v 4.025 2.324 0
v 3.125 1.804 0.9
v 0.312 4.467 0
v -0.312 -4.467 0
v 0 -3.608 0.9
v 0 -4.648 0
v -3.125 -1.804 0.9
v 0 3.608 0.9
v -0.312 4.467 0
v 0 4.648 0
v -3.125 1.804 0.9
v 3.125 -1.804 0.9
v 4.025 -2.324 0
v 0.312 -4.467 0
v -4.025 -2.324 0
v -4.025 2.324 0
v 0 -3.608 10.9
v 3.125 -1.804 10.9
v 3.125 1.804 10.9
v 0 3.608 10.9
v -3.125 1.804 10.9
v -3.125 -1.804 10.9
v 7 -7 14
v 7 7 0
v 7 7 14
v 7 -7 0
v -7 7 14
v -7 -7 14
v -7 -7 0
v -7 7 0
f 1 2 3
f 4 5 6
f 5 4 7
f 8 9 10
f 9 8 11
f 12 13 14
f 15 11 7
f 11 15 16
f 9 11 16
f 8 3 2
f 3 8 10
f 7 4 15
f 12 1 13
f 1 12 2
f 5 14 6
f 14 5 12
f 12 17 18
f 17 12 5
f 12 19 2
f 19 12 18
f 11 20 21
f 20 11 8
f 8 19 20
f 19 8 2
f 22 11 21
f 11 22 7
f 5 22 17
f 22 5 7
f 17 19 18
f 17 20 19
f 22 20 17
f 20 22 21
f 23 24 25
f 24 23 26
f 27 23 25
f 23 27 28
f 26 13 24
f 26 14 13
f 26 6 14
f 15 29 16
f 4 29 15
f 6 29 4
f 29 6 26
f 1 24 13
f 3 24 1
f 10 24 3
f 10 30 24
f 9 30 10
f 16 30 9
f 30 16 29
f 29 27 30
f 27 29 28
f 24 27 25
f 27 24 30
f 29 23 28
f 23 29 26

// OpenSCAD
// file: ../utilities/functions_ext.scad
// Funciones sacadas de otras librerías y de diferentes autores

include <constants_oblomobka.scad>

/* A circular helix of radius a and pitch 2πb is described by the following parametrisation:
x(t) = a*cos(t),
y(t) = a*sin(t),
z(t) = b*t
Licensed under the MIT license.
© 2010 by Elmo Mäntynen
*/
function b(pitch) = pitch/(TAU);
function t(pitch, z) = z/b(pitch);
function helix_curve(pitch, radius, z) = [radius*cos(deg(t(pitch, z))), radius*sin(deg(t(pitch, z))), z];


/* Utility functions.
 * Originally by Hans Häggström, 2010.
 * Dual licenced under Creative Commons Attribution-Share Alike 3.0 and LGPL2 or later
 */
function distance(a, b) = sqrt( (a[0] - b[0])*(a[0] - b[0]) +
                                (a[1] - b[1])*(a[1] - b[1]) +
                                (a[2] - b[2])*(a[2] - b[2]) );

function length2(a) = sqrt( a[0]*a[0] + a[1]*a[1] );

function normalized(a) = a / (max(distance([0,0,0], a), 0.00001));

function normalized_axis(a) = 	a == "x" ? [1, 0, 0]:
                  			 	a == "y" ? [0, 1, 0]:
                   				a == "z" ? [0, 0, 1]: normalized(a);

function angleOfNormalizedVector(n) = [0, -atan2(n[2], length2([n[0], n[1]])), atan2(n[1], n[0]) ];

function angle(v) = angleOfNormalizedVector(normalized(v));

function angleBetweenTwoPoints(a, b) = angle(normalized(b-a));
// file: ../utilities/shapes_oblomobka.scad
// Shapes
// (C) @oblomobka - 2014
// GPL3

include <constants_oblomobka.scad>
include <functions_oblomobka.scad>
include <functions_ext.scad>

use <transformations_oblomobka.scad>

// --- Piramide con base circunscrita en un círculo definido en las variables
module pyramid_circumscribed (	n=4,			// nº lados de la base de la pirámide	
								d1=20,		// diámetro del círculo-base donde se circunscribe la pirámide
								d2=0,		// diámetro del círculo-punta donde se circunscribe la pirámide
								h=10			// altura de la pirámide
								){

if(n%2==0){
	rotate([0,0,180/n])
		cylinder (r1=d1/2/cos(180/n), r2=d2/2/cos(180/n), h=h, $fn=n);
	}
	else{
		rotate([0,0,90/n])
			cylinder (r1=d1/2/cos(180/n), r2=d2/2/cos(180/n), h=h, $fn=n);
		}

}
// ------- pyramid_circumscribed (n=n,d1=d1,d2=d2,h=h); -----------------

// --- Prisma con base circunscrita en un círculo definido en las variables
module prism_circumscribed (	n=4,			// nº lados de la base del prisma
							d=20,		// diámetro del círculo donde se circunscribe el prisma
							h=10			// altura del prisma
							){
if(n%2==0){
	rotate([0,0,180/n])
		cylinder (r=d/2/cos(180/n), h=h, $fn=n);
	}
	else{
		rotate([0,0,90/n])
			cylinder (r=d/2/cos(180/n), h=h, $fn=n);
		}
}
// ------- prism_circumscribed (n=n,d=d,h=h); -----------------



// Toros

// Definido por el diámetro exterior y el diámetro del círculo en revolución
module torusOD (d1,d2,resolution){
$fn=resolution;	
rotate_extrude(){
	translate([d1/2-d2/2,0,0])
		circle(r=d2/2);
	}
}

// Definido por el diámetro exterior y el diámetro interior
module torusOI (d1,d2,resolution){
$fn=resolution;	
d=(d1-d2)/2;
rotate_extrude(){
	translate([d1/2-d/2,0,0])
		circle(r=d/2);
	}
}

// Definido por el diámetro de la línea neutra y el diámetro del círculo en revolución
module torusND (d1,d2,resolution){
$fn=resolution;	
rotate_extrude(){
	translate([d1/2,0,0])
		circle(r=d2/2);
	}
}

module torus_sector(d1,d2,angle=360,mode=1,extreme=true,resolution=32){

if(angle<=0 || angle>=360){
	if(mode==1){torusOD(d1,d2,resolution=resolution);}
	else{if(mode==2){torusND(d1,d2,resolution=resolution);}
	else{if(mode==3){torusOI(d1,d2,resolution=resolution);}}}
	}

else{
	if(mode==1){
		union(){
			sector(angle,d1,d2/2)torusOD(d1,d2,resolution=resolution);
			if(extreme==true){
				translate([d1/2-d2/2,0,0])sphere(d2/2,$fn=resolution);
				translate([(d1/2-d2/2)*cos(angle),(d1/2-d2/2)*sin(angle),0])sphere(d2/2,$fn=resolution);
				}
			}
		}
	else{
		if(mode==2){
			union(){
				sector(angle,d1+d2,d2/2)torusND(d1,d2,resolution=resolution);
				if(extreme==true){
					translate([d1/2,0,0])sphere(d2/2,$fn=resolution);
					translate([d1/2*cos(angle),d1/2*sin(angle),0])sphere(d2/2,$fn=resolution);
					}
				}
			}
		else{
			if(mode==3){
				union(){
					sector(angle,d1,(d1-d2)/4)torusOI(d1,d2,resolution=resolution);
					if(extreme==true){
						translate([d1/2-(d1-d2)/4,0,0])sphere((d1-d2)/4,$fn=resolution);
						translate([(d1/2-(d1-d2)/4)*cos(angle),(d1/2-(d1-d2)/4)*sin(angle),0])sphere((d1-d2)/4,$fn=resolution);
						}
					}
				}
			}
		}
	}
}


// Tubos

module tubeOT (d,t,h,resolution=resolution){	
	difference(){
		cylinder(r=d/2,h=h,$fn=resolution);
		cylinder(r=(d-2*t)/2,h=3*h,center=true,$fn=resolution);
		}
}

// Definido por el diámetro exterior y el diámetro interior
module tubeOI (d1,d2,h,resolution=resolution){
	difference(){
		cylinder(r=d1/2,h=h,$fn=resolution);
		cylinder(r=d2/2,h=3*h,center=true,$fn=resolution);	
		}
}

// Definido por el diámetro de la línea neutra y el diámetro del círculo en revolución
module tubeNT (d,t,h,resolution=resolution){
	difference(){
		cylinder(r=(d+t)/2,h=h,$fn=resolution);
		cylinder(r=(d-t)/2,h=3*h,center=true,$fn=resolution);
	}
}

module tube_sector(d=25,t=2,h=1,angle=360,mode=1,extreme=true,resolution=32){

if(angle<=0 || angle>=360){
	if(mode==1){tubeOT(d,t,h,resolution=resolution);}
	else{if(mode==2){tubeNT(d,t,h,resolution=resolution);}
	else{if(mode==3){tubeOI(d,t,h,resolution=resolution);}}}
	}

else{
	if(mode==1){
		union(){
			sector(angle,d,h)tubeOT(d,t,h,resolution=resolution);
			if(extreme==true){
				translate([d/2-t/2,0,0])cylinder(r=t/2,h=h,$fn=resolution);
				translate([(d/2-t/2)*cos(angle),(d/2-t/2)*sin(angle),0])cylinder(r=t/2,h=h,$fn=resolution);;
				}
			}
		}
	else{
		if(mode==2){
			union(){
				sector(angle,d+t,h)tubeNT(d,t,h,resolution=resolution);
				if(extreme==true){
					translate([d/2,0,0])cylinder(r=t/2,h=h,$fn=resolution);
					translate([d/2*cos(angle),d/2*sin(angle),0])cylinder(r=t/2,h=h,$fn=resolution);
					}
				}
			}
		else{
			if(mode==3){
				union(){
					sector(angle,d,h)tubeOI(d,t,h,resolution=resolution);
					if(extreme==true){
						translate([d/2-(d-t)/4,0,0])cylinder(r=(d-t)/4,h=h,$fn=resolution);
						translate([(d/2-(d-t)/4)*cos(angle),(d/2-(d-t)/4)*sin(angle),0])cylinder(r=(d-t)/4,h=h,$fn=resolution);
						}
					}
				}
			}
		}
	}
}

//torus_sector(d1=15,d2=4,angle=215,mode=3,extreme=true,resolution=50);
//tube_sector(d=24,t=11,h=15,angle=250,mode=1,extreme=true,resolution=50);

pyramid_circumscribed(n=10,d=8,h=4);
// file: ../utilities/transformations_oblomobka.scad
// Transformations
// (C) @oblomobka - 2014
// GPL3

// Transforma una forma en un sector según un ángulo dado.

module sector(	angle, 	// es el ángulo del sector, lo que quedará de la forma original
				d,		// valor auxiliar, será como mínimo igual al diámetro del cilindro que envuelve la forma original
				h		// valor auxiliar, será como mínimo igual a la altura del cilindro que envuelve la forma original
				){

POINTS=[	[0,0,-h],
		[0,0,h],
		[d*cos(0*angle/4),d*sin(0*angle/4),-h],
		[d*cos(0*angle/4),d*sin(0*angle/4),h],
		[d*cos(1*angle/4),d*sin(1*angle/4),-h],
		[d*cos(1*angle/4),d*sin(1*angle/4),h],
		[d*cos(2*angle/4),d*sin(2*angle/4),-h],
		[d*cos(2*angle/4),d*sin(2*angle/4),h],
		[d*cos(3*angle/4),d*sin(3*angle/4),-h],
		[d*cos(3*angle/4),d*sin(3*angle/4),h],
		[d*cos(4*angle/4),d*sin(4*angle/4),-h],
		[d*cos(4*angle/4),d*sin(4*angle/4),h],
		];

TRIANGLES=[	[0,1,2],
			[1,3,2],
			[2,3,4],
			[3,5,4],
			[4,5,6],
			[5,7,6],
			[6,7,8],
			[7,9,8],
			[8,9,10],
			[9,11,10],
			[10,11,0],
			[11,1,0],

			[5,3,1],
			[7,5,1],
			[9,7,1],
			[11,9,1],
			[0,2,4],
			[0,4,6],
			[0,6,8],
			[0,8,10]
			];

if(angle<=0 || angle>=360){
	child();
	}
	else{
		intersection(){
			polyhedron(points=POINTS,triangles=TRIANGLES);
			child();
			}
		}
}

//sector (150,40,10)cylinder(r=20,h=10); // Ejemplo de uso de la tansformación sector()
// file: ../utilities/functions_oblomobka.scad
// Functions
// (C) @oblomobka - 2014
// GPL3

include <constants_oblomobka.scad>

// da el diámetro interior del cono(d1,d2,h) a una altura interior(hi) conocida
function di_cone(d1,d2,h,hi)=d2+(d1-d2)*(1-hi/h);

// da la altura interior del cono(d1,d2,h) a un diametro(di) conocido
function hi_cone(d1,d2,h,di)=-h*((di-d2)/(d1-d2)-1);

// 
function r_circle_intersection (d1,d2)=sqrt(pow(d1/2,2)-pow(d2/2,2));

// Relaciones entre radio, apotema y lado en un polígono de n lados
function side_apothem (apothem,n)=apothem*2*tan(180/n);
function apothem_radius(radius,n)=radius*cos(180/n);
function radius_apothem(apothem,n)=apothem/cos(180/n);
function side_radius (radius,n)=radius*2*sin(180/n);

// limita los posibles valores de x, que siempre estarán comprendidos entre un minimo(a) y un maximo(z)
function lim(a,x,z)=max(a,min(x,z));

// transforma angulo, radianes --> hexadecimal
function deg(angle) = 180*angle/PI;
// transforma angulo, hexadecimal --> radianes
function rad(angle) = angle*PI/180;
// file: ../utilities/limits_oblobots.scad
//PIN
	d_pin_minmax=[10,30];			//	d_pin=lim(d_pin_minmax[0],pin[0],d_pin_minmax[1]);			
	h_pin_minmax=[0,10];			//	h_pin=lim(h_pin_minmax[0],pin[1],h_pin_minmax[1]);

//LEGS & FOOTS
	d_leg_minmax=[10,30];			//	d_leg=lim(d_leg_minmax[0],leg[0],d_leg_minmax[1]);
	h_leg_minmax=[20,90];			//	h_leg=lim(h_leg_minmax[0],leg[1],h_leg_minmax[1]);	
	n_leg_minmax=[4,16];			//	n_leg=lim(n_leg_minmax[0],leg[2],n_leg_minmax[1]);
	legsposition_minmax=[0,100];	// 	legsposition=lim(legsposition_minmax[0],leg[1],legsposition_minmax[1]);

	l_foot_minmax=[24,70];		//	l_foot=lim(l_foot_minmax[0],foot[0],l_foot_minmax[1]);
	h_foot_minmax=[0,40];			//	h_foot=lim(h_foot_minmax[0],foot[1],h_foot_minmax[1]);

//HIP | WAIST
	//C
	d_hip_minmax=[25,80];			//	d_hip=lim(d_hip_minmax[0],hip[0],d_hip_minmax[1]);
	h_hip_minmax=[10,70];			//	h_hip=lim(h_pin+2,hip[1],h_hip_minmax[1]);
	f_hip_minmax=[0,100];			//	f_hip=lim(f_hip_minmax[0],hip[2],f_hip_minmax[1]);

								//	d1_waist=lim(d_pin,waist[0],d_hip);
								//	d2_waist=lim(d_pin,waist[1],d1_waist);
	h_waist_minmax=[0.3,20];		//	h_waist=lim(h_waist_minmax[0],waist[2],h_waist_minmax[1]);

	
	//Q
	x_hip_minmax=[20,90];			//	x_hip=lim(x_hip_minmax[0],hip[0],x_hip_minmax[1]);
	y_hip_minmax=[20,60];			//	y_hip=lim(y_hip_minmax[0],hip[1],y_hip_minmax[1]);
	z_hip_minmax=[10,60];			//	z_hip=lim(z_hip_minmax[0],hip[2],z_hip_minmax[1]);
	bevel_hip_minmax=[0.5,20];	//	bevel_hip=lim(bevel_hip_minmax[0],hip[3],bevel_hip_minmax[1]);

	n_waist_minmax=[4,50];		//	n_waist=lim(n_waist_minmax[0],waist[3],n_waist_minmax[1]);
								//	d1_waist=lim(d_pin,waist[0],min(x_hip,y_hip));
								//	d2_waist=lim(d_pin,waist[1],d1_waist);


//TRUNK | SHOULDER | NECK
	//C
	d1_trunk_minmax=[30,100];		//	d1_trunk=lim(d1_trunk_minmax[0],trunk[0],d1_trunk_minmax[1]); 
	d2_trunk_minmax=[30,100];		//	d2_trunk=lim(d2_trunk_minmax[0],trunk[1],d1_trunk);
	h_trunk_minmax=[24,100];		//	h_trunk=lim(h_trunk_minmax[0],trunk[2],h_trunk_minmax[1]);

	d1_shoulder_minmax=[12,50];	//	d1_shoulder=lim(d1_shoulder_minmax[0],shoulder[0],h_trunk*sin(angle_trunk));
	d_aux_shoulder_minmax=[0,10];	//	d_aux_shoulder=lim(d_aux_shoulder_minmax[0],shoulder[1],d_aux_shoulder_minmax[1]);
	h_shoulder_minmax=[0,50];		//	h_shoulder=lim(h_shoulder_minmax[0],shoulder[2],d2_trunk/2);

								//	d1_neck=lim(d_pin+2,neck[0],d2_trunk);
								//	d2_neck=lim(d_pin+2,neck[1],d1_neck);
	h_neck_minmax=[0.3,20];		//	h_neck=lim(h_neck_minmax[0],neck[2],h_neck_minmax[1]);

	//Q
	x_trunk_minmax=[20,90];		//	x_trunk=lim(x_trunk_minmax[0],trunk[0],x_trunk_minmax[1]);
	y_trunk_minmax=[20,90];		//	y_trunk=lim(d_pin+1+x_trunk/5,trunk[1],y_trunk_minmax[1]);
	z_trunk_minmax=[26,90];		//	z_trunk=lim(z_trunk_minmax[0],trunk[2],z_trunk_minmax[1]);
	
	n_neck_minmax=[4,50];			//	n_neck=lim(n_neck_minmax[0],neck[3],n_neck_minmax[1]);
								//	d1_neck=lim(d_pin+2,neck[0],min(x_trunk,y_trunk));	
								//	d2_neck=lim(d_pin+2,neck[1],d1_neck);

	//ELECTRIC TRUNK
	d_polygonal_trunk_minmax=[45,80];	//d_polygonal_trunk=lim(d_polygonal_trunk_minmax[0],trunk[0],d_polygonal_trunk_minmax[1]);							
	h_polygonal_trunk_minmax=[87,120];	//h_polygonal_trunk=lim(h_polygonal_trunk_minmax[0],trunk[1],h_polygonal_trunk_minmax[1]);
	thickness_trunk_minmax=[1,6];	//thickness_trunk=lim(thickness_trunk_minmax[0],trunk[2],thickness_trunk_minmax[1]);

// ARMS | HANDS
	// C
	d_arm_minmax=[10,40];			// 	d_arm=lim(d_arm_minmax[0],arm[0],d_arm_minmax[1]);
								//	d_arm=lim(d_pin+1,arm[0],d_arm_minmax[1]);	
	h_arm_minmax=[5,25];			// 	h_arm=lim(h_arm_minmax[0],arm[1],h_arm_minmax[1]);
	armpit_minmax=[0.3,60];		//	armpit=lim(armpit_minmax[0],arm[2],armpit_minmax[1]);
	l_arm_minmax=[20,120];		// 	l_arm=lim(d_arm+d_hand,arm[2],l_arm_minmax[1]);	

	d_hand_minmax=[10,60];		//	d_hand=lim(d_hand_minmax[0],hand[0],d_hand_minmax[1]);
	h_hand_minmax=[3,25];			//	h_hand=lim(h_hand_minmax[0],hand[1],h_arm-0.5);
	angle_hand_minmax=[0,180];	//	angle_hand=lim(angle_hand_minmax[0],hand[2]/2,angle_hand_minmax[1]);

	// Q
	x_arm_minmax=[5,25];			// 	x_arm=lim(x_arm_minmax[0],arm[1],x_arm_minmax[1]);
	y_arm_minmax=[10,40];			// 	y_arm=lim(y_arm_minmax[0],arm[0],y_arm_minmax[1]);
	z_arm_minmax=[20,120];		//	z_arm=lim(y_arm+5+d_hand,arm[2],z_arm_minmax[1]);

	n_hand_minmax=[4,12];			// 	n_hand=lim(n_hand_minmax[0],2*floor(hand[2]/2),n_hand_minmax[1]);
								//	h_hand=lim(h_hand_minmax[0],hand[1],x_arm-0.5);

// HEAD | EYES | BRAIN
	// C
	h_head_minmax=[20,100];		// 	h_head=lim(h_head_minmax[0],head[2],h_head_minmax[1]);
	d1_head_minmax=[20,60];		// 	d1_head=lim(h_head_minmax[0],head[0],h_head_minmax[1]);
	d2_head_minmax=[15,150];		// 	d2_head=lim(h_head_minmax[0],head[1],2*h_head+d1_head);

	// Q
	x_head_minmax=[20,100];		// x_head=lim(x_head_minmax[0],head[0],x_head_minmax[1]);
	y_head_minmax=[20,100];		// y_head=lim(y_head_minmax[0],head[1],y_head_minmax[1]);
	z_head_minmax=[20,100];		// z_head=lim(z_head_minmax[0],head[2],z_head_minmax[1]);

	d_eye_minmax=[5,40];			// 	d_eye=lim(d_eye_minmax[0],eye[0],(d1_head+d2_head)/2);
	h_eye_minmax=[1,10];			// 	h_eye=lim(h_eye_minmax[0],eye[1],h_eye_minmax[1]);
	edge_eye_minmax=[1,12];		//	edge_eye=lim(edge_eye_minmax[0],eye[2],d_eye/2-3);

	frown_eye_expression_minmax=[0,100];		// frown_eye_expression=lim(frown_eye_expression_minmax[0],eye_expression[1],frown_eye_expression_minmax[1]);
	bridge_eye_position_minmax=[0,100];		// bridge_eye_position=lim(bridge_eye_position_minmax[0],eye_position[0],bridge_eye_position_minmax[1]);	
	f_h_eye_position_minmax=[0,100];			// f_h_eye_position=lim(f_h_eye_position_minmax[0],eye_position[1],f_h_eye_position_minmax[1]);	

	h_brain_minmax=[0,40];			//	h_brain=lim(h_brain_minmax[0],brain[0],h_brain_minmax[1]);
	edge_brain_minmax=[0,25];			//	edge_brain=lim(edge_brain_minmax[0],brain[1],edge_brain_minmax[1]);

//BADGE
	d_badge_minmax=[20,40];		//	d_badge=lim(d_badge_minmax[0],badge[0],d_badge_minmax[1])
	h_badge_minmax=[0.5,5];		// 	h_badge=lim(h_badge_minmax[0],badge[1],h_badge_minmax[1]);
	n_badge_minmax=[4,50];		// 	n_badge=lim(n_badge_minmax[0],badge[3],n_badge_minmax[1]);
	edge_badge_minmax=[1,5];		//	edge_badge=lim(edge_badge_minmax[0],badge[2],edge_badge_minmax[1]);
// file: ../utilities/external_elements_oblobots.scad
//////////////////////////////////////////////////////////////////////////////////////////////////
// external elements [OBLOBOTS] 
// librería de elementos externos comerciales (botones automáticos, espigas de madera baterías, ...) 
// que se usan en las partes de los oblobots
//////////////////////////////////////////////////////////////////////////////////////////////////
// (c) Jorge Medal (@oblomobka) - Sara Alvarellos (@trecedejunio) 2014-02
//////////////////////////////////////////////////////////////////////////////////////////////////
// GPL license
//////////////////////////////////////////////////////////////////////////////////////////////////

//-- BOTONES AUTOMÁTICOS - Press Fastener (PF)
//-- Cada código corresponde a las medidas de un modelo concreto

//XXX= [ xx,xx,xx,xx,xx,xx,xx ];		// [ 	diametro hembra,
									//		espesor hembra,
									//		diámetro alojamiento en hembra (aparece en los botones para coser),
									//		saliente del alojamiento en hembra (aparece en los botones para coser),
									//		diámetro macho,
									//		espesor macho	
									//		tipo]

NULL=[0,0,0,0,0,0,0];				// no hay botón automático 
//PON = [11.7,2.35,0,0,11.7,1.6 ];	// marca desconocida, encontrado en Pontejos (Madrid)
//PRYM10 = [11,2.2,0,0,11,2.0];		// marca PRYM - 10 mm
PRYM_SNAP_FASTENERS_11 = [10.1,1.4,3.5,3,9.1,1,2];	// marca PRYM - Snap fasteners 11mm
PRYM_SNAP_FASTENERS_9 = [8.5,1.5,3,2.7,8.1,1,2];	// marca PRYM - Snap fasteners 9mm

fit_male=0.7;

//-- Espigas de madera - DOWEL

DOWEL_8=[8,40,0,0,0,0,1];
DOWEL_6=[6,30,0,0,0,0,1];

//-- TUBOS DE PLÁSTICO

PIPE_6=[6,20,0,0,0,0,1];



//-- BATERÍAS CILÍNDRICAS

//XX= [ xx,xx ];		// [ 	diametro de la pila,
					//		longitud	de la pila	]

AA = [ 14.5, 50.5 ];
AAA = [ 10.5,44.5 ];
C = [ 26.2, 50 ];
D = [ 34.2, 61.5 ]; 
// file: ../utilities/constants_oblomobka.scad
// números transcendentes

TAU = 2*PI; //6.2831853071 (PI ya está definido en Openscad)
EULER=2.71828282;


// números algebraicos

PHI=(1+sqrt(5))/2;


// Vectores

X = [1, 0, 0];
Y = [0, 1, 0];
Z = [0, 0, 1];
// main file
//////////////////////////////////////////////////////////////////////////////////////////////////
// gap [OBLOBOTS] 
// 
//////////////////////////////////////////////////////////////////////////////////////////////////
// (c) Jorge Medal (@oblomobka) - Sara Alvarellos (@trecedejunio) 2014-04 - v.10
//////////////////////////////////////////////////////////////////////////////////////////////////
// GPL license
//////////////////////////////////////////////////////////////////////////////////////////////////

include <../utilities/constants_oblomobka.scad>
include <../utilities/external_elements_oblobots.scad>
include <../utilities/limits_oblobots.scad>

use <../utilities/functions_oblomobka.scad>
use <../utilities/transformations_oblomobka.scad>
use <../utilities/shapes_oblomobka.scad>



//////////////////////////////////////////////////////
////////// MÓDULOS TIPO BOTÓN AUTOMÁTICO /////////////

layer=0.3;
edge=0.3;

////////// HEMBRAS ////////////////////

module gap (gap=DOWEL_6, deep=15, play=0){								
$fn=6;

h=gap[1];
d=gap[0]+0.25+play;

translate([0,0,-0.1])
	union(){
		pyramid_circumscribed (d1=d+2,d2=d,h=1,n=6);
		translate([0,0,0.9])
			prism_circumscribed (d=d,h=deep+0.1,n=6);
		}	
}


// ------ Ejemplos de alojamiento para botones automáticos ----------------


lado=14;
$fn=50;

difference(){
	translate([0,0,lado/2])
		cube([lado,lado,lado],center=true);
	gap(gap=DOWEL_6,deep=PIPE_6[1]/2,play=0);
}
